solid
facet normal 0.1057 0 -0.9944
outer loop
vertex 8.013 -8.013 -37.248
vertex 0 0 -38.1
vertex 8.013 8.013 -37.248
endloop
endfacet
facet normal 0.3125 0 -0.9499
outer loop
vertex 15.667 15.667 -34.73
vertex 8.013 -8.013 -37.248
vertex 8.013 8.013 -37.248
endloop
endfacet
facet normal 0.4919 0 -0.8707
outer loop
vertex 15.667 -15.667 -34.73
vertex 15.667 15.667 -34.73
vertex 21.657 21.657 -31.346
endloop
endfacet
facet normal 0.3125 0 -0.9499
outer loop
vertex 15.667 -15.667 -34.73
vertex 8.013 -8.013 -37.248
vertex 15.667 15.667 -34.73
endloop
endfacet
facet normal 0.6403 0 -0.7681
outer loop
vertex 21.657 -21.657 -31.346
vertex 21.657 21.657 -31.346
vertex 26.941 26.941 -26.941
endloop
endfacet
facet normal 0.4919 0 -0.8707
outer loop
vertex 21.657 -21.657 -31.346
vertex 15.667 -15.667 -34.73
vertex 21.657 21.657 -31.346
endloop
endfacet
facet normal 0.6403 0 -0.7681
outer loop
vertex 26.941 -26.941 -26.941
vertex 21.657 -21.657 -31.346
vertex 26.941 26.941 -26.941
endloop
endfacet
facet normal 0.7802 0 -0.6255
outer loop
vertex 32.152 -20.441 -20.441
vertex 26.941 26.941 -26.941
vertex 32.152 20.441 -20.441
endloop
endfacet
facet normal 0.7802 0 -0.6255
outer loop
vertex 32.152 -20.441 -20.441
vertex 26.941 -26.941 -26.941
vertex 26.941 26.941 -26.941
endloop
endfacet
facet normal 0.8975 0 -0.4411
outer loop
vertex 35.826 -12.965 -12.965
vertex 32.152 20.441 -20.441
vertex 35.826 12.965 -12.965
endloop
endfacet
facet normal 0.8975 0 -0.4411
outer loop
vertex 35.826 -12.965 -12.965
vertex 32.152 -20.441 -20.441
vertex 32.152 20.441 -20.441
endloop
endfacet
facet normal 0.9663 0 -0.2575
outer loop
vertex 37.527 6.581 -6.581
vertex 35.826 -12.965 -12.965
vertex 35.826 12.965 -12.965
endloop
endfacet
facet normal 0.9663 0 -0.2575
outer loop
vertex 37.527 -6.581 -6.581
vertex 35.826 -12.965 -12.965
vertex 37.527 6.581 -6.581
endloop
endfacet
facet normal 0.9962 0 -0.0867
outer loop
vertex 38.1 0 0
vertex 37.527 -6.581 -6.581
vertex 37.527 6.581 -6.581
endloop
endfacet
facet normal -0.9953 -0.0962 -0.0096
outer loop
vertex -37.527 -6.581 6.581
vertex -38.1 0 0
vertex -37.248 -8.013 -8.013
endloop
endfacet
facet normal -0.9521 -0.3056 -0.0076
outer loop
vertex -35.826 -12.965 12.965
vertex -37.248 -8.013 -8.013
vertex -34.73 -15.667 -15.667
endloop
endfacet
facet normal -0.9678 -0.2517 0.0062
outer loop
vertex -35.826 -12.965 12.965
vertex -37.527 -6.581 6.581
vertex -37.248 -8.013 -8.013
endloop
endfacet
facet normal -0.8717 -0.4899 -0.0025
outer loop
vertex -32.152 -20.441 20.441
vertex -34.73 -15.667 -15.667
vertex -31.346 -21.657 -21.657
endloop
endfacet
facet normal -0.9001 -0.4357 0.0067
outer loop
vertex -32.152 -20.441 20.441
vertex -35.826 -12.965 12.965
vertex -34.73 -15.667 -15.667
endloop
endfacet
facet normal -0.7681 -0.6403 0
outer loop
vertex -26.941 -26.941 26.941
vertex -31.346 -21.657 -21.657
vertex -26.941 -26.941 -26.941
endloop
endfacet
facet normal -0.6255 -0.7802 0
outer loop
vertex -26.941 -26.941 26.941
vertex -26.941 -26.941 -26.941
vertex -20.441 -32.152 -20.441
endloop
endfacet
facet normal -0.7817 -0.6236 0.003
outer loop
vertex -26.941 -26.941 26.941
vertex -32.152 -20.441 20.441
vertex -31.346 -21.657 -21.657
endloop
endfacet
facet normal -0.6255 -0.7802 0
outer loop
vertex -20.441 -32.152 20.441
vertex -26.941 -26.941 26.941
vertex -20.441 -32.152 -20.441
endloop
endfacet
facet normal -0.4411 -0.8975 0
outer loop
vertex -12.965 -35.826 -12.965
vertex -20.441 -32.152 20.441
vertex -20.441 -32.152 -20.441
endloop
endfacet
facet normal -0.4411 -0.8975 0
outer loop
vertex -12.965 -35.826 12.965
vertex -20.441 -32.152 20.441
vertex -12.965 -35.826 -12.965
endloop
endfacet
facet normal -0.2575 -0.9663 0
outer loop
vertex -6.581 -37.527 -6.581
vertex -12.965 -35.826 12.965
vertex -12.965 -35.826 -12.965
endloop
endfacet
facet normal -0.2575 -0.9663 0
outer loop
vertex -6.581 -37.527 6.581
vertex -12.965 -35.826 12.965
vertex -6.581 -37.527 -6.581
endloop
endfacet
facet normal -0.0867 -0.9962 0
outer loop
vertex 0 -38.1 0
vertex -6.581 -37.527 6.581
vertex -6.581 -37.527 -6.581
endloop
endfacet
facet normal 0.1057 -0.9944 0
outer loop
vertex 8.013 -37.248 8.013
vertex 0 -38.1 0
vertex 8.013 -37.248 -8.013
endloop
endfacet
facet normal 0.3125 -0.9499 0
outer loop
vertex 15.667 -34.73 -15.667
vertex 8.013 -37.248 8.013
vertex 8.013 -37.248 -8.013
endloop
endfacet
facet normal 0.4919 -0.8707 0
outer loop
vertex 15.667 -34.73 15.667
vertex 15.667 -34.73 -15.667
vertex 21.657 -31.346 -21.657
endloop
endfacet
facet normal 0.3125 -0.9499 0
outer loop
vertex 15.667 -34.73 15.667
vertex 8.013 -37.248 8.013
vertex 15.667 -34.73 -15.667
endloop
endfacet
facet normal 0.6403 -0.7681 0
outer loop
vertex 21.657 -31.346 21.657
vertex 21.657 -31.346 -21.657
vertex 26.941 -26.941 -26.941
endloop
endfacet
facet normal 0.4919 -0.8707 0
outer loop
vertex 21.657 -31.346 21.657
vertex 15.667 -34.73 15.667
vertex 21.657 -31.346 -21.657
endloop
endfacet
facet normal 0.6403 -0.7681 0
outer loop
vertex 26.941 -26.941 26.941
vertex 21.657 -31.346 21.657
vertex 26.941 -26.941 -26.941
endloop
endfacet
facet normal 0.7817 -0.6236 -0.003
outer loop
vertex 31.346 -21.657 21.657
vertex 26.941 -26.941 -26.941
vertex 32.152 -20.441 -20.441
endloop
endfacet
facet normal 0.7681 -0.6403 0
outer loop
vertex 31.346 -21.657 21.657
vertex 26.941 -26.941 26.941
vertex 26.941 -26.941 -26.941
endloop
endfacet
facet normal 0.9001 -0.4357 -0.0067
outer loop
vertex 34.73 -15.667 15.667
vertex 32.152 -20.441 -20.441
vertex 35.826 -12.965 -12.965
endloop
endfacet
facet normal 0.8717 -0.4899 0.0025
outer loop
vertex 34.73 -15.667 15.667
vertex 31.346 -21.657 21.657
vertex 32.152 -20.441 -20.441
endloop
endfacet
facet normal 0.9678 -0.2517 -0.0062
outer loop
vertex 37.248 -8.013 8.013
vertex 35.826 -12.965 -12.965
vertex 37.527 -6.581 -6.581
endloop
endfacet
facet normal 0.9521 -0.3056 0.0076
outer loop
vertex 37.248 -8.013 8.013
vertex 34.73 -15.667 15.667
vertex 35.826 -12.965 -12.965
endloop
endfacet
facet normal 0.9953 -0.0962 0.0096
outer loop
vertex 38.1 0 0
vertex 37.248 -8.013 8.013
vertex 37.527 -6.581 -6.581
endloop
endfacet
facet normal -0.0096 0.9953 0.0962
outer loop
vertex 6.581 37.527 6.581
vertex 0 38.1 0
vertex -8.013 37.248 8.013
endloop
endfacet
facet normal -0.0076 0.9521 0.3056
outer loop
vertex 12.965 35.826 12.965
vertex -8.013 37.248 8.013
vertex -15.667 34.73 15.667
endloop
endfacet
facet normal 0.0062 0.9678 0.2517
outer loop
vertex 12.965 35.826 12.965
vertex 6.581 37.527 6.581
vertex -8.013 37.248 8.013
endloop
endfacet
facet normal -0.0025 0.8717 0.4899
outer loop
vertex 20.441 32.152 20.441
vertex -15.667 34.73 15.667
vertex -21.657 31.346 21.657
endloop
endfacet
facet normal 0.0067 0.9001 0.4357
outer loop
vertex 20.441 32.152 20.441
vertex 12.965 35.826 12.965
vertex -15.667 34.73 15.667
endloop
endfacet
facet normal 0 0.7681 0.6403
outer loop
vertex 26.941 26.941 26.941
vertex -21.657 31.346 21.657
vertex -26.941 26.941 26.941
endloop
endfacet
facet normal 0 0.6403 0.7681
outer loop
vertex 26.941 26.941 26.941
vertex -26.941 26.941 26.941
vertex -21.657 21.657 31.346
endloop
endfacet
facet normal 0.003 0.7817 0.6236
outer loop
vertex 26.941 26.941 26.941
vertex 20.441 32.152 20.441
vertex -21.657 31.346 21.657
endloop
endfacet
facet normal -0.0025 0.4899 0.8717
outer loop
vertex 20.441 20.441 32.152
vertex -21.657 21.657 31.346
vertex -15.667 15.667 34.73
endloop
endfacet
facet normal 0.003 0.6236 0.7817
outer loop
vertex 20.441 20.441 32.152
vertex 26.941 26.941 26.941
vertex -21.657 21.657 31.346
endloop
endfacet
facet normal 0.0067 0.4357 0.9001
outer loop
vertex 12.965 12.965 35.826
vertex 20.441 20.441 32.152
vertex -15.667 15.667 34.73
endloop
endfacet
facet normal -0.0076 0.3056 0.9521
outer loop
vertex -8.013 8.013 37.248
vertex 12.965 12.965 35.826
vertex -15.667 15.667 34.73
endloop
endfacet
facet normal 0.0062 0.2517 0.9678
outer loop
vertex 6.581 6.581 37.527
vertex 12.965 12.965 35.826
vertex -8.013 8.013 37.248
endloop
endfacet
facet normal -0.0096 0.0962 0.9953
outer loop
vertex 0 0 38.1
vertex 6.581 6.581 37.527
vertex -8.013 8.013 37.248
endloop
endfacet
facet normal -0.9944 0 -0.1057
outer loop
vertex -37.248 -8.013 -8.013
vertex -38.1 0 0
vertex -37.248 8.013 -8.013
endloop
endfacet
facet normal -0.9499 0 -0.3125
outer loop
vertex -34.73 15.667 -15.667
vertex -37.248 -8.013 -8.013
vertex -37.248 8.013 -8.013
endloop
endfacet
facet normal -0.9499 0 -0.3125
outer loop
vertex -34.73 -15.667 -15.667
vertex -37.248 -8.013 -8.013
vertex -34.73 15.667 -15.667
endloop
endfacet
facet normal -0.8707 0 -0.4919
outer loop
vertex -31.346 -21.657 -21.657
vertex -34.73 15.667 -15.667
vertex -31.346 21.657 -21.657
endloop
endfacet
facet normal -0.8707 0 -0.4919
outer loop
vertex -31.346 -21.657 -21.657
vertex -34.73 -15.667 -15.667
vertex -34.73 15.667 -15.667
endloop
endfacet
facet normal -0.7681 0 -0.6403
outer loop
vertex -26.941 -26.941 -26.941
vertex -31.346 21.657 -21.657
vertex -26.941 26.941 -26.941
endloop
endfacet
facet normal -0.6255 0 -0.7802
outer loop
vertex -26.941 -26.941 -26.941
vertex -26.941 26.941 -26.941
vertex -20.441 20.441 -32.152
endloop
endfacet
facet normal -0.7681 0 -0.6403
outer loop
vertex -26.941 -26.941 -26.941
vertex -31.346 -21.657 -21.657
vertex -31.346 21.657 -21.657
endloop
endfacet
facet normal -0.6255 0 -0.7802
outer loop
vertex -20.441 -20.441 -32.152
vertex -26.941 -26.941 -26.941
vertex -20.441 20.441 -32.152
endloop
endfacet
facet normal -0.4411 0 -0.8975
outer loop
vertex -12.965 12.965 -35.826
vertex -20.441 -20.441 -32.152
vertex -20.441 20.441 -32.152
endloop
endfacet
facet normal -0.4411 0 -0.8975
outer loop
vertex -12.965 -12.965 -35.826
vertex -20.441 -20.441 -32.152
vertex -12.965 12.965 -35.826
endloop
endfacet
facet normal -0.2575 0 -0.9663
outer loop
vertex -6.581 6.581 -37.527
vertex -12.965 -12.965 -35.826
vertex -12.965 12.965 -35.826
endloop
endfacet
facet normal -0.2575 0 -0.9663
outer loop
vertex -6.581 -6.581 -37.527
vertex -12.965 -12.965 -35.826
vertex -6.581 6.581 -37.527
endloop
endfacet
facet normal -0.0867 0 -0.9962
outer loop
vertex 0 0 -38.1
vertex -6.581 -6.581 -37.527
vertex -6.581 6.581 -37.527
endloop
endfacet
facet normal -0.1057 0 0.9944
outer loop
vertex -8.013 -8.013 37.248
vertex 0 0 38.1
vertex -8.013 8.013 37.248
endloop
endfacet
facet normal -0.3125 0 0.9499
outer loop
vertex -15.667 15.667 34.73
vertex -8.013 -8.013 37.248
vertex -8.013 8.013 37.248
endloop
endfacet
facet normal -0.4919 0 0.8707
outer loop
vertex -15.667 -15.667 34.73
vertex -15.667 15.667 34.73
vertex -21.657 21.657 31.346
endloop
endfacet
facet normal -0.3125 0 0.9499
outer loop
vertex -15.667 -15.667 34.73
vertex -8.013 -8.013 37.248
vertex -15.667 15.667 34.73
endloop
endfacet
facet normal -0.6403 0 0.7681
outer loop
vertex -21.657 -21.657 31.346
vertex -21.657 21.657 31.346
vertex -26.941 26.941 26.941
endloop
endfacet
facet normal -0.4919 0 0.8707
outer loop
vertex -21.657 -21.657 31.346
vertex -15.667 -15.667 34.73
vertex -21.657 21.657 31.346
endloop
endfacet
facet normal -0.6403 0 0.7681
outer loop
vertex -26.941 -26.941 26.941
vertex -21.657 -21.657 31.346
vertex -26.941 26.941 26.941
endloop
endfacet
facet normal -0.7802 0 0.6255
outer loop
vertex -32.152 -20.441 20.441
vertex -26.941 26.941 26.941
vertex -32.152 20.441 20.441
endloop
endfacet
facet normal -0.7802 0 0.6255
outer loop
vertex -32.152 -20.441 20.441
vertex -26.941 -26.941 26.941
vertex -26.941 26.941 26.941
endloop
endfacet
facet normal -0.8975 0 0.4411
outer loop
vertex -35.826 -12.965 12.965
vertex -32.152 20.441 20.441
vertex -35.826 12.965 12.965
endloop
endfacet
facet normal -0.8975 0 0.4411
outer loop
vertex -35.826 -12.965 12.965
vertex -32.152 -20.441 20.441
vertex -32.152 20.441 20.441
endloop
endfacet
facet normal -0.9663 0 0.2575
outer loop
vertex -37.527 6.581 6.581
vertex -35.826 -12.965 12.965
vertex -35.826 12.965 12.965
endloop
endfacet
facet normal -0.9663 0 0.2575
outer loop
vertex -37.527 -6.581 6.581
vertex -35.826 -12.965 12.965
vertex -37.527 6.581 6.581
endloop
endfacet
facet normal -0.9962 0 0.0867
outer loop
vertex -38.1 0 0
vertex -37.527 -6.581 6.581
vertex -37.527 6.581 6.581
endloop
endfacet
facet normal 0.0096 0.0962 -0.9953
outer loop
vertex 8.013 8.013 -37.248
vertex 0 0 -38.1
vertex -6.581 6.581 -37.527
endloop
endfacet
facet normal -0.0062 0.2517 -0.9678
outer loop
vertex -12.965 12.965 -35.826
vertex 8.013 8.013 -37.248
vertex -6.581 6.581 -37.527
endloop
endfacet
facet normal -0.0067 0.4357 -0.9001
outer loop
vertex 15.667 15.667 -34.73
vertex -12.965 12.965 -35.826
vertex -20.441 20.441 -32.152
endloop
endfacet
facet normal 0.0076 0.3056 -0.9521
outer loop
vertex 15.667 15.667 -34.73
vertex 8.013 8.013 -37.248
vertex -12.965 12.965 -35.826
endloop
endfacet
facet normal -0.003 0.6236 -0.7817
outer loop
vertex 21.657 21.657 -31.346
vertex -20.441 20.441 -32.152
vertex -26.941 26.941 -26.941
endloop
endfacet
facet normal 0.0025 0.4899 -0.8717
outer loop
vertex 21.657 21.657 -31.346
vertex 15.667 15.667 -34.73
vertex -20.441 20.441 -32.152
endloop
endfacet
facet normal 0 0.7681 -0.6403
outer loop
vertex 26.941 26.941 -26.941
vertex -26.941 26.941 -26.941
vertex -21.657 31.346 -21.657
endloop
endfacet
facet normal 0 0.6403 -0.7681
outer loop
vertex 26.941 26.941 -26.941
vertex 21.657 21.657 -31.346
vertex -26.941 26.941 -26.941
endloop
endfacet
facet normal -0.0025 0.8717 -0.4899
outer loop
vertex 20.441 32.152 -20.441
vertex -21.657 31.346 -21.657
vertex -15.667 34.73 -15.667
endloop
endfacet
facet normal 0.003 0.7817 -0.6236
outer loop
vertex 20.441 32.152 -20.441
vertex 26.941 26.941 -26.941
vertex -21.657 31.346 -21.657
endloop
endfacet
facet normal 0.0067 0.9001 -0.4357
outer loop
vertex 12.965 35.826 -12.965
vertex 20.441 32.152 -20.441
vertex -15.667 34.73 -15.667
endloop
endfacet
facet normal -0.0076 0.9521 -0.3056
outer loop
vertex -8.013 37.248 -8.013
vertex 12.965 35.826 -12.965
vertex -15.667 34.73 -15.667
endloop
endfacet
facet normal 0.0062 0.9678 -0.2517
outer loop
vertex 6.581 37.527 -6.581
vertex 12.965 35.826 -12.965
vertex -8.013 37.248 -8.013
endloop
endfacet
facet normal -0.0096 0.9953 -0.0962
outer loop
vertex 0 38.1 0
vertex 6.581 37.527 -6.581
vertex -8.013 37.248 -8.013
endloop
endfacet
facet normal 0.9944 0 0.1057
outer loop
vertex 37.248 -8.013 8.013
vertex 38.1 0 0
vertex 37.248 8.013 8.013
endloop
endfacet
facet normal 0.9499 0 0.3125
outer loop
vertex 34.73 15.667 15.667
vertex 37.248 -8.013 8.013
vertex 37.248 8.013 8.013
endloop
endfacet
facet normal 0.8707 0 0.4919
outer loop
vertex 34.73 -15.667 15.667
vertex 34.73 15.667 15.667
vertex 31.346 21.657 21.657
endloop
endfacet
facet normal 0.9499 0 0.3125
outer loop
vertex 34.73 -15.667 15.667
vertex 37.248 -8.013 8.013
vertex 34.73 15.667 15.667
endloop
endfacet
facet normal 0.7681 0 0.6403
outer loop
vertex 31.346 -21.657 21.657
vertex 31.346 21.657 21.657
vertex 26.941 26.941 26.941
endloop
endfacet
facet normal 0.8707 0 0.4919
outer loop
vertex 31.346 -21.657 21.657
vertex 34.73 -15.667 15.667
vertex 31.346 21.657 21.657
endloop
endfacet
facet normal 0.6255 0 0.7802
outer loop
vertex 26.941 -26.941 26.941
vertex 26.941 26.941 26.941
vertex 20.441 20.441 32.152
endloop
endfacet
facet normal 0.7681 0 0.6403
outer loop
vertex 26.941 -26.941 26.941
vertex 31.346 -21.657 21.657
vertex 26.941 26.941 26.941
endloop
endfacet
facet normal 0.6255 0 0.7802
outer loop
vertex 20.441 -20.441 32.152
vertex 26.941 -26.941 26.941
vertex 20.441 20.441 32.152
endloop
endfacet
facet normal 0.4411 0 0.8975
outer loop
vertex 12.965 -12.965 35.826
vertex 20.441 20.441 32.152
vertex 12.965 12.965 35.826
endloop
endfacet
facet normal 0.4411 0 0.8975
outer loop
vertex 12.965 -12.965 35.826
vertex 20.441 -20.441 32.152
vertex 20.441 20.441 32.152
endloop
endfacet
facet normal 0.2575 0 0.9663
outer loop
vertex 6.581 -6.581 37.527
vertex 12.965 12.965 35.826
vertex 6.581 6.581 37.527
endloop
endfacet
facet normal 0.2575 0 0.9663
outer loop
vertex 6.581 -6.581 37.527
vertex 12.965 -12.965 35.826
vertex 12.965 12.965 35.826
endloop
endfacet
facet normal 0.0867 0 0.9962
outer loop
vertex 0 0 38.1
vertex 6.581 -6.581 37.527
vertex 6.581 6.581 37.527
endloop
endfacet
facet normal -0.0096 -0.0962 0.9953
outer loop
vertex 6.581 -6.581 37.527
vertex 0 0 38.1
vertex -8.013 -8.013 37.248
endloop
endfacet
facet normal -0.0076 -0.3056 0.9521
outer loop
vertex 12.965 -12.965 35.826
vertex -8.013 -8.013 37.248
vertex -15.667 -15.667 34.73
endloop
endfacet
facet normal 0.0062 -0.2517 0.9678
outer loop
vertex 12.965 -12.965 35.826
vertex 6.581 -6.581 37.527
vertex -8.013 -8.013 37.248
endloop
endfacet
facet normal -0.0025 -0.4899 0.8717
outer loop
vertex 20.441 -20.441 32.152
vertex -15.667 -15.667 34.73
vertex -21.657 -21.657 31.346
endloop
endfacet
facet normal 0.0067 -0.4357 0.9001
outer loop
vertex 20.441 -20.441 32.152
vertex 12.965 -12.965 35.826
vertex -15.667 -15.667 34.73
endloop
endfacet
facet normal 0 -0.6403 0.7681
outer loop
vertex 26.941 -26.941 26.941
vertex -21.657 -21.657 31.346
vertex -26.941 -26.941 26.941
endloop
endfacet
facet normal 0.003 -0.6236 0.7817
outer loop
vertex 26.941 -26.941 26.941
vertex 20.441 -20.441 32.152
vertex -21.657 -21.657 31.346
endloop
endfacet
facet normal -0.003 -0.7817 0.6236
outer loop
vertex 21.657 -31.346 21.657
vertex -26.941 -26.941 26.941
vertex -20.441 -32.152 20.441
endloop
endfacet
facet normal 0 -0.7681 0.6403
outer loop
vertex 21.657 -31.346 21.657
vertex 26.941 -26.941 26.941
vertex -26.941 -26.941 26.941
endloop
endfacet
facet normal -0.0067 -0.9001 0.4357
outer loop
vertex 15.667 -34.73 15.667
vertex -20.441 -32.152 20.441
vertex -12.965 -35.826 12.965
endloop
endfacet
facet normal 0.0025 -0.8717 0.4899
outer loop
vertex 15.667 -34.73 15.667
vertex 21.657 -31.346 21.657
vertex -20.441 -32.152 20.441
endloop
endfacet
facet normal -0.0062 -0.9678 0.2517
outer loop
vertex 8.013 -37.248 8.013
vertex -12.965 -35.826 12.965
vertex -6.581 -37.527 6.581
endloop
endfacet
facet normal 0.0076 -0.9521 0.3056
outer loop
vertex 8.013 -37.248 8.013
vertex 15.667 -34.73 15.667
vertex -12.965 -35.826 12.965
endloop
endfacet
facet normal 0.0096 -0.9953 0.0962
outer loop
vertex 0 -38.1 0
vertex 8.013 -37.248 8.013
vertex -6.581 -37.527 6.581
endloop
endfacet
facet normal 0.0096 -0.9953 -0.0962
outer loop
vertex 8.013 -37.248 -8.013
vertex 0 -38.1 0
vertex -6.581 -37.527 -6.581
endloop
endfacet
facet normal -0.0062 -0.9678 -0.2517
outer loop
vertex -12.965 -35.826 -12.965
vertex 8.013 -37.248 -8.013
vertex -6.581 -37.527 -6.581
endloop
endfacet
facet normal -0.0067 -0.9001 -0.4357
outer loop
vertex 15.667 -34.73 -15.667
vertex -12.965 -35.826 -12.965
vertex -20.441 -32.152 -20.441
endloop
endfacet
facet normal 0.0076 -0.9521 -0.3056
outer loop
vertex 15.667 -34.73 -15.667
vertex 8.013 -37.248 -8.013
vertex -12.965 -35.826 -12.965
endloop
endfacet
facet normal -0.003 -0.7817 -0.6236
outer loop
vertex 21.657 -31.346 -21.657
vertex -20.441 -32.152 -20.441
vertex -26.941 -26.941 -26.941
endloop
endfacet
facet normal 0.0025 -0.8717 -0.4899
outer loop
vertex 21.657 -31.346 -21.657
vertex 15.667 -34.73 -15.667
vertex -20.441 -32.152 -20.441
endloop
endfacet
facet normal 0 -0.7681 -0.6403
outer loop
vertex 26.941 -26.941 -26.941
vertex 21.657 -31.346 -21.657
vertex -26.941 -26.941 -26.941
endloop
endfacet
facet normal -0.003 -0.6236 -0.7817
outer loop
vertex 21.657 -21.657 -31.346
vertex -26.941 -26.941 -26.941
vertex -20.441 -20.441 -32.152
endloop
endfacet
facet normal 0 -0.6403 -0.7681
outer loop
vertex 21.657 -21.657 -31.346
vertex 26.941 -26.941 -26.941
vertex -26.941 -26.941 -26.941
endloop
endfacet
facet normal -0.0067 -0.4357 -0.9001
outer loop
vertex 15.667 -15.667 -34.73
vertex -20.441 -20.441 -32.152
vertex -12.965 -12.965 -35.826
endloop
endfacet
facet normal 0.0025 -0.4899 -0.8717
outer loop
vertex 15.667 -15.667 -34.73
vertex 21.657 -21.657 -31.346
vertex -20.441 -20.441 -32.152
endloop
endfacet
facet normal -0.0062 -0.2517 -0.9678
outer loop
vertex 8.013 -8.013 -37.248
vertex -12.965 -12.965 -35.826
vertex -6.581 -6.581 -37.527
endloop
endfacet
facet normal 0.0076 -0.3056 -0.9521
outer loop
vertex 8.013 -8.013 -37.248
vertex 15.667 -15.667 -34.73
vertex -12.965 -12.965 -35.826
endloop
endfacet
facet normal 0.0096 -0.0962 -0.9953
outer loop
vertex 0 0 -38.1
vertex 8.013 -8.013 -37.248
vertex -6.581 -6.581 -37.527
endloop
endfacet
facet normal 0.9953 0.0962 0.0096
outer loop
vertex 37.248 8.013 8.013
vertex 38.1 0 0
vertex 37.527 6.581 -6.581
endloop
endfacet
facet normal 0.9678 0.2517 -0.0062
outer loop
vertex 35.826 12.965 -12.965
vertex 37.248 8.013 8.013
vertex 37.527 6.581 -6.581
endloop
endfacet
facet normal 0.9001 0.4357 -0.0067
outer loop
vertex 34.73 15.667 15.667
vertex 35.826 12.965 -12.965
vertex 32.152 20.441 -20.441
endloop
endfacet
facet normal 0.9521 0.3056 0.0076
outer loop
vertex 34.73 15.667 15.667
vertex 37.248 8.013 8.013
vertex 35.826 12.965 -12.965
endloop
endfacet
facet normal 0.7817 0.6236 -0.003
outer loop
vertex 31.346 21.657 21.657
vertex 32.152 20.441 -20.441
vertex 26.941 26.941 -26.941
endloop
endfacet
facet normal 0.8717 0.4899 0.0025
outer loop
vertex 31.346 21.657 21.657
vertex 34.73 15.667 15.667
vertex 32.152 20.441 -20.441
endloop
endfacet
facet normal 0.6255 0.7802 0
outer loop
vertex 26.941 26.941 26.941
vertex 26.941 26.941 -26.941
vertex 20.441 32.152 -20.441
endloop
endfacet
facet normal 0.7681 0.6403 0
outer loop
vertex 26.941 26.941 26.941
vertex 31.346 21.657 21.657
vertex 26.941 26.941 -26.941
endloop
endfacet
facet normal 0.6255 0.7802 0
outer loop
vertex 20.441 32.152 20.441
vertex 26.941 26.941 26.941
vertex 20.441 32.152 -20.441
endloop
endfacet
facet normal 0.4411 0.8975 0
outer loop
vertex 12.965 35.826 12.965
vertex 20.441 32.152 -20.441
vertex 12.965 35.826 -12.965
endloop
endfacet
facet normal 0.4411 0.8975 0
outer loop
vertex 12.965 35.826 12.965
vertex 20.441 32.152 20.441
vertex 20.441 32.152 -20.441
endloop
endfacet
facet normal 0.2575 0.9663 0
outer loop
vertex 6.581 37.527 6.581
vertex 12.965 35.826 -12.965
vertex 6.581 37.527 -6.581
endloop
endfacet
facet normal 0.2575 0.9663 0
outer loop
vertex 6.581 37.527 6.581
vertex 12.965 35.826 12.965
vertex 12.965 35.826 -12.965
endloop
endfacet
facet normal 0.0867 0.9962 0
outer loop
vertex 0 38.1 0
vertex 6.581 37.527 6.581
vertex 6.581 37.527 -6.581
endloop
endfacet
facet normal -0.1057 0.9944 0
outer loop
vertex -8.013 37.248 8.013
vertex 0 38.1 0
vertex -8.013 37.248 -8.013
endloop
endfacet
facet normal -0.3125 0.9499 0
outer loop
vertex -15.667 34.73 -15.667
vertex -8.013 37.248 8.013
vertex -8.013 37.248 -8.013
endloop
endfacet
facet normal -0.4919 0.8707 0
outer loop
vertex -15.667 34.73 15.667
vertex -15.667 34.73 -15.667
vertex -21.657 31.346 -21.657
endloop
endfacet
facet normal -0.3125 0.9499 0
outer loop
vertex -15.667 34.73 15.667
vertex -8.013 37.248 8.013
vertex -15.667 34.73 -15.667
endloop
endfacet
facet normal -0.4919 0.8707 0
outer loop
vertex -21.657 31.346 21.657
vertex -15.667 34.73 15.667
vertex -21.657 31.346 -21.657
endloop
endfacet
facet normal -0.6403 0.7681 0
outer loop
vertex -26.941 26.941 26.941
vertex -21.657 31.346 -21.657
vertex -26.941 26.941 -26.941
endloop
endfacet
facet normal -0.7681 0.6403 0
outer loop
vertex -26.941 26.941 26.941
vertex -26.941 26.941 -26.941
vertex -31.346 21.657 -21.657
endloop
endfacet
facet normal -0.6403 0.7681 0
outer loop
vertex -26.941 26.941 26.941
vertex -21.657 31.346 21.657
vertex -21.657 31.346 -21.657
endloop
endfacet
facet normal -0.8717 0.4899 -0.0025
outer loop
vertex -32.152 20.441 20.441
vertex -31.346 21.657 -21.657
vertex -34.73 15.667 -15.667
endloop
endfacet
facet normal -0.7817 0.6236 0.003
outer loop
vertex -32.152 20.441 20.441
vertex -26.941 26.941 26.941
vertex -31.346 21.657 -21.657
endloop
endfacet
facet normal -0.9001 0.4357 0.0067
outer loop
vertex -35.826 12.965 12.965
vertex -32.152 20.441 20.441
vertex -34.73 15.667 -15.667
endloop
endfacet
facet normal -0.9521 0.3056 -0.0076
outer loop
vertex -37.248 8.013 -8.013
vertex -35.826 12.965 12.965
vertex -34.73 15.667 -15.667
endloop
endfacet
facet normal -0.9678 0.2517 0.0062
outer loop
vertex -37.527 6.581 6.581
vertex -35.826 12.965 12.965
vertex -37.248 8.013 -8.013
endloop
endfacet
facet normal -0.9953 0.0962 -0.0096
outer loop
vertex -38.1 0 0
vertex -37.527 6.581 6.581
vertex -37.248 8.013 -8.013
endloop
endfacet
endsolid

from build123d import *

# Parameters (mm, degrees)
F0_R     = 38.1
F1_DEPTH = 38.1
F2_R     = 38.1
F3_DEPTH = 44.704
F4_R     = 38.1
F5_DEPTH = 63.246


with BuildPart() as f1:
    # F0 (on Front) → F1 (new body, symmetric)
    with BuildSketch(Plane.XZ):
        Circle(F0_R)
    extrude(amount=F1_DEPTH, both=True)

    # F2 (on Top) → F3 (intersect, symmetric)
    with BuildSketch(Plane.XY):
        Circle(F2_R)
    extrude(amount=F3_DEPTH, both=True, mode=Mode.INTERSECT)

    # F4 (on Right) → F5 (intersect, symmetric)
    with BuildSketch(Plane.YZ):
        Circle(F4_R)
    extrude(amount=F5_DEPTH, both=True, mode=Mode.INTERSECT)


solid = f1.part
